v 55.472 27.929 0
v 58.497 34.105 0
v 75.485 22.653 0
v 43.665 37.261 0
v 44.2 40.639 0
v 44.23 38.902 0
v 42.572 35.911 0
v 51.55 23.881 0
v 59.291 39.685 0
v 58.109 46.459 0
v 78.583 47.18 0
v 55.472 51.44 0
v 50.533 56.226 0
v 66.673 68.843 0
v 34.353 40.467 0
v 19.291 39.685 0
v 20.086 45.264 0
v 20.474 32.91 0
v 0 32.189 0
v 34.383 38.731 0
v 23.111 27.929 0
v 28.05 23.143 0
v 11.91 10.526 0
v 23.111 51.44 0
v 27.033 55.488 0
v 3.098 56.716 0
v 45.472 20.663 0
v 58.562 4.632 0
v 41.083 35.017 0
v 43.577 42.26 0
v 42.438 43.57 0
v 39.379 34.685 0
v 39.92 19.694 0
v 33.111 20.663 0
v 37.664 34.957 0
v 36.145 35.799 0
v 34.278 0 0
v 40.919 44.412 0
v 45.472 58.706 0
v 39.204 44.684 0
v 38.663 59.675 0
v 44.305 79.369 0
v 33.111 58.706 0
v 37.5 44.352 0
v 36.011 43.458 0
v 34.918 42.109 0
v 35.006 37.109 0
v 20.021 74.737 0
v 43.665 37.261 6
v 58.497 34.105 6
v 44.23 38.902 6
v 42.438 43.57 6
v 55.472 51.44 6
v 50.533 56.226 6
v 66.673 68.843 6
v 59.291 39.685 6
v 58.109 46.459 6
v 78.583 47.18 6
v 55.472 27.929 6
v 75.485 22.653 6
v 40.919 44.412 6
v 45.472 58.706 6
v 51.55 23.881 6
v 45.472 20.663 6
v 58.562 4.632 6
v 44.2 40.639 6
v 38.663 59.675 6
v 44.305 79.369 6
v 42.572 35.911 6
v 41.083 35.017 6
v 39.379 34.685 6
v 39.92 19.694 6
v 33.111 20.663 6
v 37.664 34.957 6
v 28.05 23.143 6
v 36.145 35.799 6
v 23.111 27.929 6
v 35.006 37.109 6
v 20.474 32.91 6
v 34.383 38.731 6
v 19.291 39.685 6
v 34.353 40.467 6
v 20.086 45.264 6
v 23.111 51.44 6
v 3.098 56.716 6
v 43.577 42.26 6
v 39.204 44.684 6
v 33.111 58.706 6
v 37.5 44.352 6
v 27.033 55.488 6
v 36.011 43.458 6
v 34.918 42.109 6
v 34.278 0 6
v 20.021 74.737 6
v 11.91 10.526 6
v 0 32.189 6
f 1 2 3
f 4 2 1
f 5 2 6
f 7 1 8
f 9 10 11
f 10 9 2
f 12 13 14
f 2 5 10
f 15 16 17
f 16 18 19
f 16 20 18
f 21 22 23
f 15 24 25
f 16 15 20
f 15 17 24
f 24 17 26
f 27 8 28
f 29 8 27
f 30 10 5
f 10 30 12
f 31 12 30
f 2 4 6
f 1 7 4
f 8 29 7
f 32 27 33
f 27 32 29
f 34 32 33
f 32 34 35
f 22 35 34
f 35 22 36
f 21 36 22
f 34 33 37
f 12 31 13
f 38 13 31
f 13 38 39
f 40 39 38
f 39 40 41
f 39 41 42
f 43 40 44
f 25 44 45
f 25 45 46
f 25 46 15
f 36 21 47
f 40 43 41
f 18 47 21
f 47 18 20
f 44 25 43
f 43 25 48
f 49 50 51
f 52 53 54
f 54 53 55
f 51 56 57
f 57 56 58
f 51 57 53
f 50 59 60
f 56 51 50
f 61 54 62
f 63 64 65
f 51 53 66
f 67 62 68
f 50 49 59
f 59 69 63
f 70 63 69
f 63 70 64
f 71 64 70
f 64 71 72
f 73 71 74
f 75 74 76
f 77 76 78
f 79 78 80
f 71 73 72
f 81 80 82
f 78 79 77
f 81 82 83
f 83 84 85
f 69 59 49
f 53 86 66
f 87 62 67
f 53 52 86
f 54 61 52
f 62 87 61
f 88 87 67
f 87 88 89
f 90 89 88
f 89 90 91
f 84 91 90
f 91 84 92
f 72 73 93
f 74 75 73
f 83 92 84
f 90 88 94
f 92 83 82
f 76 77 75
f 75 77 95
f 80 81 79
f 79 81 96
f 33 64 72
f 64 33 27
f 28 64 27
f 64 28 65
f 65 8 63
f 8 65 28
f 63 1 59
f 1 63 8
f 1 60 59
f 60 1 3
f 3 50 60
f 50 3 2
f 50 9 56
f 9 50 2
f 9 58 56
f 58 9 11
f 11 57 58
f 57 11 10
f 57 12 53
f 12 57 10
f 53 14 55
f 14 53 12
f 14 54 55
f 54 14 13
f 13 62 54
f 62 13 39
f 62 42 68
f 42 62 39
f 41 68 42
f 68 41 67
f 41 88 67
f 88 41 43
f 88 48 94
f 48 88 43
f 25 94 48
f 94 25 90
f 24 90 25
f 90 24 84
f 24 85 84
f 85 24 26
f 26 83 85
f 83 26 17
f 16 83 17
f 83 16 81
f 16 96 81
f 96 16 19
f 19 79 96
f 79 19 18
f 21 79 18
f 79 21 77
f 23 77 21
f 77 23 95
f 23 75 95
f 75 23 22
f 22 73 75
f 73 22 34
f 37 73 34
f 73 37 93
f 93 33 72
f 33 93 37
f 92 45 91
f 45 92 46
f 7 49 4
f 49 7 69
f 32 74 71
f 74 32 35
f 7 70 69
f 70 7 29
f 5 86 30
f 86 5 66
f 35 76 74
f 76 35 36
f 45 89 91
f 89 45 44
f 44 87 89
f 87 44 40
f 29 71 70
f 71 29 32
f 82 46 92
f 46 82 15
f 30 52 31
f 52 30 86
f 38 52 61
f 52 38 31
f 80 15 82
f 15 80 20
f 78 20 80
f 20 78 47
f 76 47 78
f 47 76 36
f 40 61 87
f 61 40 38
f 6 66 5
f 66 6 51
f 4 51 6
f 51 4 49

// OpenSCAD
$fn = 32;

// ----------------------------------------------------------------------
// Star wheel: 10-point ratchet, R40
// ----------------------------------------------------------------------

// --- parameters (mm) ---
n_points = 10;            // number of points / teeth
r_out = 40;               // tip radius
r_in = 20;                // root radius
bore_r = 5;               // centre bore radius
plate_t = 6;              // plate thickness, Z (extrusion height)
bore_d = 10;              // centre bore diameter

profile = [[19.291, 39.685], [0, 32.189], [20.474, 32.91], [23.111, 27.929], [11.91, 10.526], [28.05, 23.143], [33.111, 20.663], [34.278, 0], [39.92, 19.694], [45.472, 20.663], [58.562, 4.632], [51.55, 23.881], [55.472, 27.929], [75.485, 22.653], [58.497, 34.105], [59.291, 39.685], [78.583, 47.18], [58.109, 46.459], [55.472, 51.44], [66.673, 68.843], [50.533, 56.226], [45.472, 58.706], [44.305, 79.369], [38.663, 59.675], [33.111, 58.706], [20.021, 74.737], [27.033, 55.488], [23.111, 51.44], [3.098, 56.716], [20.086, 45.264]];  // primary outline, 30 points, counter clockwise
void_1 = [[44.2, 40.639], [43.577, 42.26], [42.438, 43.57], [40.919, 44.412], [39.204, 44.684], [37.5, 44.352], [36.011, 43.458], [34.918, 42.109], [34.353, 40.467], [34.383, 38.731], [35.006, 37.109], [36.145, 35.799], [37.664, 34.957], [39.379, 34.685], [41.083, 35.017], [42.572, 35.911], [43.665, 37.261], [44.23, 38.902]];  // centre bore, 18 points

// --- the one profile operation ---
difference() {
  linear_extrude(height = plate_t) polygon(points = profile);
  translate([0, 0, -1])
    linear_extrude(height = plate_t + 2) polygon(points = void_1);
}
